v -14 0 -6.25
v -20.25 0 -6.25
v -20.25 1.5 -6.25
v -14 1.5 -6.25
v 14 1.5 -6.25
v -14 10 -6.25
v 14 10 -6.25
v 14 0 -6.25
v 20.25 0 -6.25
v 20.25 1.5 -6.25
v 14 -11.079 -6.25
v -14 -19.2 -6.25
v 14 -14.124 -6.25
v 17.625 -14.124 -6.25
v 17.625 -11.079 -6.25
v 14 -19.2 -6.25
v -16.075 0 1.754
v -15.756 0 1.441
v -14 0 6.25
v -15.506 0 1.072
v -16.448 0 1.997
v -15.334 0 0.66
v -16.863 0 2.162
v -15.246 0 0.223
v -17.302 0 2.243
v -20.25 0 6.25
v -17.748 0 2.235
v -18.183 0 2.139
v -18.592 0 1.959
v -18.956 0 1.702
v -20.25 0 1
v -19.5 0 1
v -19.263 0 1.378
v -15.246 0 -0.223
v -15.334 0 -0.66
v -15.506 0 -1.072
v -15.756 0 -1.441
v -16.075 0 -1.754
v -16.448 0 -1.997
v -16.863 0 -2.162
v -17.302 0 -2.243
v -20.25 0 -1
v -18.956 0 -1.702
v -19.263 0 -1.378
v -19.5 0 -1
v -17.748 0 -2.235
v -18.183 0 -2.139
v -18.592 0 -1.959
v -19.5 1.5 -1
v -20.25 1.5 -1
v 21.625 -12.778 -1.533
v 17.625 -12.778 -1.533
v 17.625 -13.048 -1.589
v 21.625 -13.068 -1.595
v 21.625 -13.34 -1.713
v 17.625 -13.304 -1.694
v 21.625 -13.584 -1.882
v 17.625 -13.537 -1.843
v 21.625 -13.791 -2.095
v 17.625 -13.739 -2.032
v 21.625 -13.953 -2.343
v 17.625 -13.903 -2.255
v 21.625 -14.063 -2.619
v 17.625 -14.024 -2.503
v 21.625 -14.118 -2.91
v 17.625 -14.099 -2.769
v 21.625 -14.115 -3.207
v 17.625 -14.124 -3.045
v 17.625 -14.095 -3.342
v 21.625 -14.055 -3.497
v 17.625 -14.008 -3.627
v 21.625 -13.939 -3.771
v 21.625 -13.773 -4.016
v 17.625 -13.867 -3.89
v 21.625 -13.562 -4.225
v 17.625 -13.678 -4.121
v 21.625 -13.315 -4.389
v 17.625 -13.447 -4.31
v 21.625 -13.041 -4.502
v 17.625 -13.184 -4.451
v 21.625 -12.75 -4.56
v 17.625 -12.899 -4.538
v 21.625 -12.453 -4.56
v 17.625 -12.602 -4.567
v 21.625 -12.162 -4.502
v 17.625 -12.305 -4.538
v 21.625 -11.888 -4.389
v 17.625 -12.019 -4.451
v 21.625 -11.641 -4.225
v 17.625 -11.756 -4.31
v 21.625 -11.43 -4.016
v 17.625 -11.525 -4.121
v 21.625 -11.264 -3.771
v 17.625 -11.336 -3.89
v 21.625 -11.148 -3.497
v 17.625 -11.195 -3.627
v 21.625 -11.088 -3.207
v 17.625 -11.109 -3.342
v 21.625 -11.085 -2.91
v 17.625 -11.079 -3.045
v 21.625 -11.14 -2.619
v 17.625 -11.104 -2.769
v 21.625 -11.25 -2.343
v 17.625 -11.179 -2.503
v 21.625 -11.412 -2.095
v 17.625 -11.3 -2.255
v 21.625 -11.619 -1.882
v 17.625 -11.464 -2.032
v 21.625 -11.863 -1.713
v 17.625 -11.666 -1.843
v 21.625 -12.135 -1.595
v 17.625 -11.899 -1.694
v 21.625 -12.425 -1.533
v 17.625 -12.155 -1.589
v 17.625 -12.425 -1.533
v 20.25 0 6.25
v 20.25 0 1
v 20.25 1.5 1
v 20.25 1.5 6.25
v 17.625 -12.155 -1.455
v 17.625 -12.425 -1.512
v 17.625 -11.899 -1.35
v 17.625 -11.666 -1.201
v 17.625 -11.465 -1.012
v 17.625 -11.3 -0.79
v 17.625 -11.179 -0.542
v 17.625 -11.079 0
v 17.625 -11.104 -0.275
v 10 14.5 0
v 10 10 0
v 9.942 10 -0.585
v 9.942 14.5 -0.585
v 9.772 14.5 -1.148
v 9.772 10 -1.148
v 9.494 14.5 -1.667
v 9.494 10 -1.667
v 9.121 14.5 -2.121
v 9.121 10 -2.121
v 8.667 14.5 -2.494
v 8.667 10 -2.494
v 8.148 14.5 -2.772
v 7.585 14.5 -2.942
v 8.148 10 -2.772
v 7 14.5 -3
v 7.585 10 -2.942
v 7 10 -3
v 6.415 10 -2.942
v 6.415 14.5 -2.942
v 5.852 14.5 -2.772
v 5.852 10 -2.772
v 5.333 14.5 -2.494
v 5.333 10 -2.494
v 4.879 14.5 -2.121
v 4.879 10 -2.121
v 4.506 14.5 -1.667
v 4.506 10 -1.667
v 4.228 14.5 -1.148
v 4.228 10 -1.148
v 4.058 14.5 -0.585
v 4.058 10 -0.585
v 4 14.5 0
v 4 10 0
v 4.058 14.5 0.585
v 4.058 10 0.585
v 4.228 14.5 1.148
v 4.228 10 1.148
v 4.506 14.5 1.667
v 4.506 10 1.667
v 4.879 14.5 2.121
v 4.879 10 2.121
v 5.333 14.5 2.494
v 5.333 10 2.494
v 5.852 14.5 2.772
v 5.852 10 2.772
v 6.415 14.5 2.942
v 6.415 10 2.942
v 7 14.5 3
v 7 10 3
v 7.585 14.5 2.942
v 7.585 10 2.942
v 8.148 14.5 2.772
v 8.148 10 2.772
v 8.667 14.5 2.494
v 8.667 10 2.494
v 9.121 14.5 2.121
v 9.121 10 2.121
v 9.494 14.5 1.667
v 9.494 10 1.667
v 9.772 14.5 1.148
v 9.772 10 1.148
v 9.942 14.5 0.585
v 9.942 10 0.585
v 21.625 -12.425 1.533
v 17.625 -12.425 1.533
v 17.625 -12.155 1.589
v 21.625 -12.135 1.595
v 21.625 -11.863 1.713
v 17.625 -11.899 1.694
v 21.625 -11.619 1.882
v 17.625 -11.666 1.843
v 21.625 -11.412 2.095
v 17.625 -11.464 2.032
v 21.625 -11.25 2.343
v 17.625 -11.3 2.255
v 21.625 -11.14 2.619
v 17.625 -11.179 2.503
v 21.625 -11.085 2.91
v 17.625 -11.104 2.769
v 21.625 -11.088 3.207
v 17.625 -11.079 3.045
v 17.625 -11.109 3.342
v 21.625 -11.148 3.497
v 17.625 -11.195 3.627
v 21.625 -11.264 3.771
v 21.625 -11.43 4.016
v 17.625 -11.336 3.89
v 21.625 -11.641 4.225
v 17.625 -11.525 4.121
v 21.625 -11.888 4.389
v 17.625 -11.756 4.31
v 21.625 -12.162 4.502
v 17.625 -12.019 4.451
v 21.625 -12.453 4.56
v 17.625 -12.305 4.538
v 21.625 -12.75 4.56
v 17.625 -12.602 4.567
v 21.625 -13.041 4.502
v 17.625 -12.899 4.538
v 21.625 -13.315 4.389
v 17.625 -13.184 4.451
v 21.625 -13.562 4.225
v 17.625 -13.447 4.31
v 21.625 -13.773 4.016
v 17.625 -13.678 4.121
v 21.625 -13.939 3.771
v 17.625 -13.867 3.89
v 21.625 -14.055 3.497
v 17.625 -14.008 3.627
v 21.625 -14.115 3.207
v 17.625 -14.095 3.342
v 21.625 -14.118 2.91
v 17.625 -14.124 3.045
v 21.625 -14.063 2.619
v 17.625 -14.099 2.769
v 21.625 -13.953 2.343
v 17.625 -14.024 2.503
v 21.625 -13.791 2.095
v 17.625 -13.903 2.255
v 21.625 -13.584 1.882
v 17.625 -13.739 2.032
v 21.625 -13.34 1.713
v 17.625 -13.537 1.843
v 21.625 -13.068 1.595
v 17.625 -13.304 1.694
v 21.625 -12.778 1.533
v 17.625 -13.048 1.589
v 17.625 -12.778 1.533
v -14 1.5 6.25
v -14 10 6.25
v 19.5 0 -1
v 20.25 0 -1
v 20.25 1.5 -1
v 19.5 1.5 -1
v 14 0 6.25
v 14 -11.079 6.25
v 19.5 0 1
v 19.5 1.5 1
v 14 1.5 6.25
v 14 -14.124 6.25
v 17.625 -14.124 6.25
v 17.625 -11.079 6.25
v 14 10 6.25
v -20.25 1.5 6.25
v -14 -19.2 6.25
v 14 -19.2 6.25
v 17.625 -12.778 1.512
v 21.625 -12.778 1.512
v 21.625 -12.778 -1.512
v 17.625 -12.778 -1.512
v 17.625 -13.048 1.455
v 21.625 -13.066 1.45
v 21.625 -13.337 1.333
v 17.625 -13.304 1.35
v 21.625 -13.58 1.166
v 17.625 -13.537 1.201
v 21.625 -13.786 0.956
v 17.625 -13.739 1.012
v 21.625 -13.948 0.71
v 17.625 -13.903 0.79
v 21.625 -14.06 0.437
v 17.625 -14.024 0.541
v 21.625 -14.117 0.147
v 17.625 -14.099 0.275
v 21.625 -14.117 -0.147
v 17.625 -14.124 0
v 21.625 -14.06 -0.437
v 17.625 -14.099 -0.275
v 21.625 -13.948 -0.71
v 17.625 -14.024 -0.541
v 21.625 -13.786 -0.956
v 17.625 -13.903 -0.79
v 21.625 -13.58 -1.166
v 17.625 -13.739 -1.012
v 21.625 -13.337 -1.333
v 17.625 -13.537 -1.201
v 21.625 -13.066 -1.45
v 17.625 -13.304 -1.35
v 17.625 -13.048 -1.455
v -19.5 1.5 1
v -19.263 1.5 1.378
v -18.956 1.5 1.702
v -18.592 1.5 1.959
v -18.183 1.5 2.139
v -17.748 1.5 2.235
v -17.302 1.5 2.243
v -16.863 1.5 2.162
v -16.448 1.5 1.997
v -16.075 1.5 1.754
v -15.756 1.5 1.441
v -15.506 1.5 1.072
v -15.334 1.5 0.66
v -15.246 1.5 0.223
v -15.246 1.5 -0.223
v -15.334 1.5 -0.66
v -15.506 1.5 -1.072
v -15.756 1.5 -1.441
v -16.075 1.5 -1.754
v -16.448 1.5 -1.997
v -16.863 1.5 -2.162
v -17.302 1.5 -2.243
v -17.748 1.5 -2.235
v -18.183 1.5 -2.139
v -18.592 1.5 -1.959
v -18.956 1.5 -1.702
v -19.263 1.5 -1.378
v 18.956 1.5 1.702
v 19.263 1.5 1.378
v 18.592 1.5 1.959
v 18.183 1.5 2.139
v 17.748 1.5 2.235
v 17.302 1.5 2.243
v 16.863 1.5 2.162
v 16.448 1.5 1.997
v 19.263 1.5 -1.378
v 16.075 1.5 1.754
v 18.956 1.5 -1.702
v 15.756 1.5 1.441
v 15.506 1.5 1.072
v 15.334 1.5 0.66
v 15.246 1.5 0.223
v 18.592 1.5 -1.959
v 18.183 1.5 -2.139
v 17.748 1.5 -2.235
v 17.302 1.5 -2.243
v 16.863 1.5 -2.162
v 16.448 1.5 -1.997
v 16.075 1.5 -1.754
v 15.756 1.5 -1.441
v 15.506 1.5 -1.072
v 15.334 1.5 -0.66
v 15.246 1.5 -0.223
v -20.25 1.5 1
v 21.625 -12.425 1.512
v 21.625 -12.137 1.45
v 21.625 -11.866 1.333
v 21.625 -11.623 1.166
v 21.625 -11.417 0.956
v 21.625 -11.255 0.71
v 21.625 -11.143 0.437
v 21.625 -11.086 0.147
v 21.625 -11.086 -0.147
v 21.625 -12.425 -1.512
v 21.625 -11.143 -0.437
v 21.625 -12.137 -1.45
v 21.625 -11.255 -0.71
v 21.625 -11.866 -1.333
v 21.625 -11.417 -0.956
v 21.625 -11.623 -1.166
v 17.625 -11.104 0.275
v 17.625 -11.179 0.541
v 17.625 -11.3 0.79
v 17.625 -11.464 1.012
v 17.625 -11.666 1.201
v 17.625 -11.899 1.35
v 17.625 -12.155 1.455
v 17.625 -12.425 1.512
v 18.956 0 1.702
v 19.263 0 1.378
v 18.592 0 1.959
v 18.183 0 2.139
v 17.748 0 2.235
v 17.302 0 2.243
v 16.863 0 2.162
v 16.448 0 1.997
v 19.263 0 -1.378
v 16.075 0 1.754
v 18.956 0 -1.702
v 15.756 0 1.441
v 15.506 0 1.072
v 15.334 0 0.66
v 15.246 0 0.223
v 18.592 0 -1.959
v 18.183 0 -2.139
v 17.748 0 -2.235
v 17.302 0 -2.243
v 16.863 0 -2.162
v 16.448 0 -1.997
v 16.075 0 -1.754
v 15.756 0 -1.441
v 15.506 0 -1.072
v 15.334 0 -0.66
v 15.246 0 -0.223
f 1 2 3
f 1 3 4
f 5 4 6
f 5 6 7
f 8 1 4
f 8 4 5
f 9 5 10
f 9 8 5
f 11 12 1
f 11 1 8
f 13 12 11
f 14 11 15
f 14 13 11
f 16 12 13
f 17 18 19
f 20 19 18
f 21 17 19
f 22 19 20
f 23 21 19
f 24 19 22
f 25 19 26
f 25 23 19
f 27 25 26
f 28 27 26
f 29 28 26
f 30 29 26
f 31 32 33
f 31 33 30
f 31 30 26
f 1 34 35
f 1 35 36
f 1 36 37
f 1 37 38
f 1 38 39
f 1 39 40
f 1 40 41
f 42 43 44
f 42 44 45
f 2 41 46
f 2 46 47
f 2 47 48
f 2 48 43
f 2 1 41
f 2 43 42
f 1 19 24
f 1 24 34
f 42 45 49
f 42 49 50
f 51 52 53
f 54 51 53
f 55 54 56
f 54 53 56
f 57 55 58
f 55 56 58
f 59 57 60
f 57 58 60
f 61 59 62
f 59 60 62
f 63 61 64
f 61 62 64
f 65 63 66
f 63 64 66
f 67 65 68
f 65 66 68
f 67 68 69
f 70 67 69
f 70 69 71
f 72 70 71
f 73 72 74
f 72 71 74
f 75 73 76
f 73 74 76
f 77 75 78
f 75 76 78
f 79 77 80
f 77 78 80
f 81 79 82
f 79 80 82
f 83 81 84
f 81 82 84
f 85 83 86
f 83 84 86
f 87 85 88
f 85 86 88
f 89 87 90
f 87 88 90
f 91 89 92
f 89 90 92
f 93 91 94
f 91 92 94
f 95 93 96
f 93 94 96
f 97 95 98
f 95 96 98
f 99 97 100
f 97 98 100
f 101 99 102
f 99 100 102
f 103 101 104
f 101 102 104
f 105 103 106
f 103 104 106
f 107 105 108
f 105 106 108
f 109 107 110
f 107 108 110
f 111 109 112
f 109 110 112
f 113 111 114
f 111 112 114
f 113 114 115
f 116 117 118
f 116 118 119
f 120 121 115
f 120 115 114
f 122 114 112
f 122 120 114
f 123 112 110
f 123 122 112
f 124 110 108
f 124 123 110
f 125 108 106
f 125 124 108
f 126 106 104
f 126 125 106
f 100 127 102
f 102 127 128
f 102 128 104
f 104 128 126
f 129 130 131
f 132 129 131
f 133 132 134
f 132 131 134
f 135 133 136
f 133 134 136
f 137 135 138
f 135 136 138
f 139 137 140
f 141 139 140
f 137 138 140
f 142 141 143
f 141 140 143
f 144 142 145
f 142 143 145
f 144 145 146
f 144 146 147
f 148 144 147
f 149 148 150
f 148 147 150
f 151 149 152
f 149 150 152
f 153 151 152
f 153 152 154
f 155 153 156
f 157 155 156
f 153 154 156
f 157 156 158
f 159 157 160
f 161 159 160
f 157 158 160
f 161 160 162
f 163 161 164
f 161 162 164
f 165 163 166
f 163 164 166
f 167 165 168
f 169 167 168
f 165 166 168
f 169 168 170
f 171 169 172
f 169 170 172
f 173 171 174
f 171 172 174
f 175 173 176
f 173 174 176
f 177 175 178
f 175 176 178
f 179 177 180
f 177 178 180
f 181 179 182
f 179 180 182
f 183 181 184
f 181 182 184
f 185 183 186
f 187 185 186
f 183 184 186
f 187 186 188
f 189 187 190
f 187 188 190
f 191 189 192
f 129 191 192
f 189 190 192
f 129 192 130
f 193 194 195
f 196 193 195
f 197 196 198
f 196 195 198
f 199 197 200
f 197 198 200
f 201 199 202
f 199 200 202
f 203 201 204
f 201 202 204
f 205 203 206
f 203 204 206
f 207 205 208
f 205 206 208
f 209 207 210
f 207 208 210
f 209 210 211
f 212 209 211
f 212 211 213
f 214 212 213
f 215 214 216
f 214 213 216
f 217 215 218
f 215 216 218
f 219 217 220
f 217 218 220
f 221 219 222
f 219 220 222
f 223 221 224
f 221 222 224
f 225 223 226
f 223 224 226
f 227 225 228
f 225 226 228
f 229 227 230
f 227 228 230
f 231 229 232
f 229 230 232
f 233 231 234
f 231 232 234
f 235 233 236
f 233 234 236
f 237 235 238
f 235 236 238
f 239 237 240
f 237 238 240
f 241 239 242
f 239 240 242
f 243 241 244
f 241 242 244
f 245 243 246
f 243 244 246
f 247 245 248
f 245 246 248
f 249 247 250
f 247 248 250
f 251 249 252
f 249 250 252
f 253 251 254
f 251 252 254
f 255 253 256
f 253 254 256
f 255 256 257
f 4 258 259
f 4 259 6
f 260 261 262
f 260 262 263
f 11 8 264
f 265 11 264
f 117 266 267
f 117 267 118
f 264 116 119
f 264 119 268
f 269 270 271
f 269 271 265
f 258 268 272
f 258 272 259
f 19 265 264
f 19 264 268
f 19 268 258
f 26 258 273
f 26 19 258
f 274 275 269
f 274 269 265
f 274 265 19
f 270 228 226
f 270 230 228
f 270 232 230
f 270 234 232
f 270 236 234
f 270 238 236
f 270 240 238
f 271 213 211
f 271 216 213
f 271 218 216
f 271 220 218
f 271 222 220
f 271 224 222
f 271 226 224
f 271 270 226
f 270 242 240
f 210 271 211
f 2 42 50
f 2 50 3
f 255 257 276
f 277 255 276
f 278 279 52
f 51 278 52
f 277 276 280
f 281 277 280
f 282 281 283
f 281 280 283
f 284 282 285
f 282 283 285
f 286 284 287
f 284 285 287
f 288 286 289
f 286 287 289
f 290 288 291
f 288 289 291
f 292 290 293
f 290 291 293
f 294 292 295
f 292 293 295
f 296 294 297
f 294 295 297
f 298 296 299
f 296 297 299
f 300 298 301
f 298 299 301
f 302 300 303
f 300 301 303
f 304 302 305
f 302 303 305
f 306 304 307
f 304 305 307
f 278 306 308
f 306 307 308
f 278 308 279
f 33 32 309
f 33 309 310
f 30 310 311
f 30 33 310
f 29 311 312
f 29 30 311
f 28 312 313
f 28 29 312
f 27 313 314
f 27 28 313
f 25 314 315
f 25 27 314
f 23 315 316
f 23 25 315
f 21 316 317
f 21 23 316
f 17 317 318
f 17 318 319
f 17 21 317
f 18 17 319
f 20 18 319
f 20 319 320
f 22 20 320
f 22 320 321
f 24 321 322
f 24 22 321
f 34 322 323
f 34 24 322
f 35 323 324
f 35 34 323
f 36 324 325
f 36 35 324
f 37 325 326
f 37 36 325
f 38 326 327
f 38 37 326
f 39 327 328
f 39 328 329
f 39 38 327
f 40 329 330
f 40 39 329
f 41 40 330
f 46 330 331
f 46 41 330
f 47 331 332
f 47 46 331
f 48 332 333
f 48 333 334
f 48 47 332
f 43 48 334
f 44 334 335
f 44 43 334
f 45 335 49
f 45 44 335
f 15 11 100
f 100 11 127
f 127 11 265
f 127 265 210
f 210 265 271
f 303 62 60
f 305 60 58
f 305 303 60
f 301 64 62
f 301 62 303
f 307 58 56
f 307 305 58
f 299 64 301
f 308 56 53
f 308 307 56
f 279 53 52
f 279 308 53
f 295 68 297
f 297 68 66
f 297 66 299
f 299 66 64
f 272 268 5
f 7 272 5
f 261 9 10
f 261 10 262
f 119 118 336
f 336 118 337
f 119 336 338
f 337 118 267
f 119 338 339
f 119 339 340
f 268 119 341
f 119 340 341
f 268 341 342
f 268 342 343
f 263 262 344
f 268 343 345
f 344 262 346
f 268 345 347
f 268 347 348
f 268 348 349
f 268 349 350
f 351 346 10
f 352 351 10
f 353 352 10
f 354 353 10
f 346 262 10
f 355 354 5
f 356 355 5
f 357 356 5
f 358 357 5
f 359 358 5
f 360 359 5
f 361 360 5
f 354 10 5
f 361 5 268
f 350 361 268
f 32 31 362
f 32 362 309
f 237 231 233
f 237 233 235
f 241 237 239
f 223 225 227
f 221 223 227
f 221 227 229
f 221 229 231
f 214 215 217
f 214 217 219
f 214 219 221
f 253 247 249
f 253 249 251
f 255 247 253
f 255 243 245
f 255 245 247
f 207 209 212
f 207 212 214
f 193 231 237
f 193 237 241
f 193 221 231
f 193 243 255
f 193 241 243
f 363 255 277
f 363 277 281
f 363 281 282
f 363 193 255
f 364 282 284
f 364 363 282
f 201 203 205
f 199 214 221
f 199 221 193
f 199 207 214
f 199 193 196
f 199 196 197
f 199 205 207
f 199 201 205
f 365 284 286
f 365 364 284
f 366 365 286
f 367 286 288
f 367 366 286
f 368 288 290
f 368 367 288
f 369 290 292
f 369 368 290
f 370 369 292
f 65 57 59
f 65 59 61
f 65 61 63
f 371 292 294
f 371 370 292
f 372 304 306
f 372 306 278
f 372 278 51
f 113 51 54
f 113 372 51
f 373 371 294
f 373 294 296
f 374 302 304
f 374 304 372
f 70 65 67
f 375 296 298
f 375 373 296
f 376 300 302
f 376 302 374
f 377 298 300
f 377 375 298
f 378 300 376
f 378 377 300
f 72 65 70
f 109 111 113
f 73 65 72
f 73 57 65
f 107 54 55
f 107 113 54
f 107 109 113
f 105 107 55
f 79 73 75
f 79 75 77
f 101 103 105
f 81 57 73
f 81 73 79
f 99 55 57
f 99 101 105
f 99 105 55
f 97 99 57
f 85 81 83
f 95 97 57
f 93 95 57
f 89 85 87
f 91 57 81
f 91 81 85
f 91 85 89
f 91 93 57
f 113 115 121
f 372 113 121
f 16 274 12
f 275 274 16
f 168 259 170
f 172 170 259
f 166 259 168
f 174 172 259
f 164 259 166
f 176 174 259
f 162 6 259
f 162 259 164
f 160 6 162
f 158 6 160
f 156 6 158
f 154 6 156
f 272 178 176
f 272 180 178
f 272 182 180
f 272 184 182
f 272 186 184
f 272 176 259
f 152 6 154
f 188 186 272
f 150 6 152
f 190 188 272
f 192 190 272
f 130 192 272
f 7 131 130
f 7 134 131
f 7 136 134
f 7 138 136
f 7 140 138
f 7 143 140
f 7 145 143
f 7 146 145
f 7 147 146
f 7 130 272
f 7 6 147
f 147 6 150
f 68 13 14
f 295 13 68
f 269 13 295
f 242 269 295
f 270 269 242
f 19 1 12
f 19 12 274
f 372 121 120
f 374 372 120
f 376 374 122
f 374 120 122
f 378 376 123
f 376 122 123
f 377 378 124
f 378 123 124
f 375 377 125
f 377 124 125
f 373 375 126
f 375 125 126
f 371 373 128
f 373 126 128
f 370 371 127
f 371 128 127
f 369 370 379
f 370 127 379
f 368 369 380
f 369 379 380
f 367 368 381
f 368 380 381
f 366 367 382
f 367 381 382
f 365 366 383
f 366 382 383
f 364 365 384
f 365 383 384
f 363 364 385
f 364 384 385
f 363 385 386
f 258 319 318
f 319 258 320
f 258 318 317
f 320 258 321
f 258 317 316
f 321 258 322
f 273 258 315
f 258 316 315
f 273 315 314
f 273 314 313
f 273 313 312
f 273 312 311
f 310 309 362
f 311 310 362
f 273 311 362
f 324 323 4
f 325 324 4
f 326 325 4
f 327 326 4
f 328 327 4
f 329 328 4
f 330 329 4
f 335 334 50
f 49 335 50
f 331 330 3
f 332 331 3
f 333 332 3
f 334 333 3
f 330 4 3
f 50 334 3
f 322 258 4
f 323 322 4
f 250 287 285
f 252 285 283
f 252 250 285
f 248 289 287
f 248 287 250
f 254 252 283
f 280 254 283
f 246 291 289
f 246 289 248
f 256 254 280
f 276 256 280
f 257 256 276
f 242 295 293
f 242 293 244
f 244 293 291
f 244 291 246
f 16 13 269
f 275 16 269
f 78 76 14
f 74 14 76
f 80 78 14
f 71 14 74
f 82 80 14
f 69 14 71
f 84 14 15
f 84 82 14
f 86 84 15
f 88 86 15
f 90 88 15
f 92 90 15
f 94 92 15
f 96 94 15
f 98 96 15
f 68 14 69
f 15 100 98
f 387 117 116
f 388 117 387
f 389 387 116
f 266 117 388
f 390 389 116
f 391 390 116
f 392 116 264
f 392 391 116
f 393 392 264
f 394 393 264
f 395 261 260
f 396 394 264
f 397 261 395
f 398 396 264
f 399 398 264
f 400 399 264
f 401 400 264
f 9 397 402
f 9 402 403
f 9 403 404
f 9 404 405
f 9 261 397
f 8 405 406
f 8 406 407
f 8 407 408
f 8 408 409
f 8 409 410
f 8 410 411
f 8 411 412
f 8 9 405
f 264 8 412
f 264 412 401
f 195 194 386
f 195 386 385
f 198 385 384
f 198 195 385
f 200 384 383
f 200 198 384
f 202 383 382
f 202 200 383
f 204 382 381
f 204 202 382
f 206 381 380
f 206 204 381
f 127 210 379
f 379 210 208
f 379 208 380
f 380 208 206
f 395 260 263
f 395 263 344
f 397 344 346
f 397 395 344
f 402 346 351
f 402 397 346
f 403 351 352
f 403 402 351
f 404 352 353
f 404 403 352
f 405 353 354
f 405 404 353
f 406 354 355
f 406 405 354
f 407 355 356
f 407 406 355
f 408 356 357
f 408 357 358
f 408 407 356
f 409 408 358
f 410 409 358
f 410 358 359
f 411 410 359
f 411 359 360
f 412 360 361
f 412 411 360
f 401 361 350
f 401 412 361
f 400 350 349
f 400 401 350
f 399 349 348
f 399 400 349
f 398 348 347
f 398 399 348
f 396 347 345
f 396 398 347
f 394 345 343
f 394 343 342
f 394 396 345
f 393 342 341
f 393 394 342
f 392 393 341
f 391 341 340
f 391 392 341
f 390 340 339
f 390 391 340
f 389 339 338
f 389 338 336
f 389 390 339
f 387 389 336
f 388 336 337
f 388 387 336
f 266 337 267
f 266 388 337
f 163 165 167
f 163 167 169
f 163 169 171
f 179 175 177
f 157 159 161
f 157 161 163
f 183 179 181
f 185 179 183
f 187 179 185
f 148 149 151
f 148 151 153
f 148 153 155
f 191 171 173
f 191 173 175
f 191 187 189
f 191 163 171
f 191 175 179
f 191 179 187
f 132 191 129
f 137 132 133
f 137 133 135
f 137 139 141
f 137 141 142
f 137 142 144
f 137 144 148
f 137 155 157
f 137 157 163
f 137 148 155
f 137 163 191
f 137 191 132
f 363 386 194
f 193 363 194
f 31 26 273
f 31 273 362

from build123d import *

# Parameters (mm, degrees)
BOSS_EXTRUDE1_DEPTH = 1.5
SKETCH2_W           = 28
SKETCH2_H           = 12.5
BOSS_EXTRUDE2_DEPTH = 8.5
SKETCH3_R           = 3
BOSS_EXTRUDE3_DEPTH = 4.5
SKETCH4_W           = 28
SKETCH4_H           = 12.5
BOSS_EXTRUDE4_DEPTH = 19.2
SKETCH5_W           = 3.625016777
SKETCH5_H           = 3.044537311
BOSS_EXTRUDE5_DEPTH = 12.5
BOSS_EXTRUDE7_DEPTH = 4


with BuildPart() as part:
    # Sketch1 → Boss-Extrude1 (new body)
    with BuildSketch(Plane(origin=(0, 0, 0), x_dir=(1, 0, 0), z_dir=(0, 1, 0))):
        with BuildLine():
            Line((20.25, -6.25), (-20.25, -6.25))
            Line((-20.25, -6.25), (-20.25, -1))
            Line((-20.25, -1), (-19.5, -1))
            ThreePointArc((-19.5, -1), (-15.234435563, 0), (-19.5, 1))
            Line((-19.5, 1), (-20.25, 1))
            Line((-20.25, 1), (-20.25, 6.25))
            Line((-20.25, 6.25), (20.25, 6.25))
            Line((20.25, 6.25), (20.25, 1))
            Line((20.25, 1), (19.5, 1))
            ThreePointArc((19.5, 1), (15.234435563, 0), (19.5, -1))
            Line((19.5, -1), (20.25, -1))
            Line((20.25, -1), (20.25, -6.25))
        make_face()
    extrude(amount=BOSS_EXTRUDE1_DEPTH)

    # Sketch2 → Boss-Extrude2 (add)
    with BuildSketch(Plane(origin=(0, 1.5, 0), x_dir=(1, 0, 0), z_dir=(0, 1, 0))):
        Rectangle(SKETCH2_W, SKETCH2_H)
    extrude(amount=BOSS_EXTRUDE2_DEPTH)

    # Sketch3 → Boss-Extrude3 (add)
    with BuildSketch(Plane(origin=(0, 10, 0), x_dir=(1, 0, 0), z_dir=(0, 1, 0))):
        with Locations((7, 0)):
            Circle(SKETCH3_R)
    extrude(amount=BOSS_EXTRUDE3_DEPTH)

    # Sketch4 → Boss-Extrude4 (add)
    with BuildSketch(Plane.XZ):
        Rectangle(SKETCH4_W, SKETCH4_H)
    extrude(amount=BOSS_EXTRUDE4_DEPTH)

    # Sketch5 → Boss-Extrude5 (add)
    with BuildSketch(Plane.XY.offset(6.25)):
        with Locations((15.812508389, -12.601527977)):
            Rectangle(SKETCH5_W, SKETCH5_H)
    extrude(amount=-BOSS_EXTRUDE5_DEPTH)

    # Sketch6 → Boss-Extrude7 (add)
    with BuildSketch(Plane(origin=(17.625016777, 0, 0), x_dir=(0, 0, -1), z_dir=(1, 0, 0))):
        with BuildLine():
            Line((-1.532511857, -12.7778257), (-1.512025454, -12.7778257))
            ThreePointArc((-1.512025454, -12.7778257), (0, -14.123796632), (1.512025454, -12.7778257))
            Line((1.512025454, -12.7778257), (1.532511857, -12.7778257))
            ThreePointArc((1.532511857, -12.7778257), (4.566805966, -12.601527977), (1.532511857, -12.425230254))
            Line((1.532511857, -12.425230254), (1.512025454, -12.425230254))
            ThreePointArc((1.512025454, -12.425230254), (0, -11.079259321), (-1.512025454, -12.425230254))
            Line((-1.512025454, -12.425230254), (-1.532511857, -12.425230254))
            ThreePointArc((-1.532511857, -12.425230254), (-4.566805966, -12.601527977), (-1.532511857, -12.7778257))
        make_face()
    extrude(amount=BOSS_EXTRUDE7_DEPTH)


solid = part.part
